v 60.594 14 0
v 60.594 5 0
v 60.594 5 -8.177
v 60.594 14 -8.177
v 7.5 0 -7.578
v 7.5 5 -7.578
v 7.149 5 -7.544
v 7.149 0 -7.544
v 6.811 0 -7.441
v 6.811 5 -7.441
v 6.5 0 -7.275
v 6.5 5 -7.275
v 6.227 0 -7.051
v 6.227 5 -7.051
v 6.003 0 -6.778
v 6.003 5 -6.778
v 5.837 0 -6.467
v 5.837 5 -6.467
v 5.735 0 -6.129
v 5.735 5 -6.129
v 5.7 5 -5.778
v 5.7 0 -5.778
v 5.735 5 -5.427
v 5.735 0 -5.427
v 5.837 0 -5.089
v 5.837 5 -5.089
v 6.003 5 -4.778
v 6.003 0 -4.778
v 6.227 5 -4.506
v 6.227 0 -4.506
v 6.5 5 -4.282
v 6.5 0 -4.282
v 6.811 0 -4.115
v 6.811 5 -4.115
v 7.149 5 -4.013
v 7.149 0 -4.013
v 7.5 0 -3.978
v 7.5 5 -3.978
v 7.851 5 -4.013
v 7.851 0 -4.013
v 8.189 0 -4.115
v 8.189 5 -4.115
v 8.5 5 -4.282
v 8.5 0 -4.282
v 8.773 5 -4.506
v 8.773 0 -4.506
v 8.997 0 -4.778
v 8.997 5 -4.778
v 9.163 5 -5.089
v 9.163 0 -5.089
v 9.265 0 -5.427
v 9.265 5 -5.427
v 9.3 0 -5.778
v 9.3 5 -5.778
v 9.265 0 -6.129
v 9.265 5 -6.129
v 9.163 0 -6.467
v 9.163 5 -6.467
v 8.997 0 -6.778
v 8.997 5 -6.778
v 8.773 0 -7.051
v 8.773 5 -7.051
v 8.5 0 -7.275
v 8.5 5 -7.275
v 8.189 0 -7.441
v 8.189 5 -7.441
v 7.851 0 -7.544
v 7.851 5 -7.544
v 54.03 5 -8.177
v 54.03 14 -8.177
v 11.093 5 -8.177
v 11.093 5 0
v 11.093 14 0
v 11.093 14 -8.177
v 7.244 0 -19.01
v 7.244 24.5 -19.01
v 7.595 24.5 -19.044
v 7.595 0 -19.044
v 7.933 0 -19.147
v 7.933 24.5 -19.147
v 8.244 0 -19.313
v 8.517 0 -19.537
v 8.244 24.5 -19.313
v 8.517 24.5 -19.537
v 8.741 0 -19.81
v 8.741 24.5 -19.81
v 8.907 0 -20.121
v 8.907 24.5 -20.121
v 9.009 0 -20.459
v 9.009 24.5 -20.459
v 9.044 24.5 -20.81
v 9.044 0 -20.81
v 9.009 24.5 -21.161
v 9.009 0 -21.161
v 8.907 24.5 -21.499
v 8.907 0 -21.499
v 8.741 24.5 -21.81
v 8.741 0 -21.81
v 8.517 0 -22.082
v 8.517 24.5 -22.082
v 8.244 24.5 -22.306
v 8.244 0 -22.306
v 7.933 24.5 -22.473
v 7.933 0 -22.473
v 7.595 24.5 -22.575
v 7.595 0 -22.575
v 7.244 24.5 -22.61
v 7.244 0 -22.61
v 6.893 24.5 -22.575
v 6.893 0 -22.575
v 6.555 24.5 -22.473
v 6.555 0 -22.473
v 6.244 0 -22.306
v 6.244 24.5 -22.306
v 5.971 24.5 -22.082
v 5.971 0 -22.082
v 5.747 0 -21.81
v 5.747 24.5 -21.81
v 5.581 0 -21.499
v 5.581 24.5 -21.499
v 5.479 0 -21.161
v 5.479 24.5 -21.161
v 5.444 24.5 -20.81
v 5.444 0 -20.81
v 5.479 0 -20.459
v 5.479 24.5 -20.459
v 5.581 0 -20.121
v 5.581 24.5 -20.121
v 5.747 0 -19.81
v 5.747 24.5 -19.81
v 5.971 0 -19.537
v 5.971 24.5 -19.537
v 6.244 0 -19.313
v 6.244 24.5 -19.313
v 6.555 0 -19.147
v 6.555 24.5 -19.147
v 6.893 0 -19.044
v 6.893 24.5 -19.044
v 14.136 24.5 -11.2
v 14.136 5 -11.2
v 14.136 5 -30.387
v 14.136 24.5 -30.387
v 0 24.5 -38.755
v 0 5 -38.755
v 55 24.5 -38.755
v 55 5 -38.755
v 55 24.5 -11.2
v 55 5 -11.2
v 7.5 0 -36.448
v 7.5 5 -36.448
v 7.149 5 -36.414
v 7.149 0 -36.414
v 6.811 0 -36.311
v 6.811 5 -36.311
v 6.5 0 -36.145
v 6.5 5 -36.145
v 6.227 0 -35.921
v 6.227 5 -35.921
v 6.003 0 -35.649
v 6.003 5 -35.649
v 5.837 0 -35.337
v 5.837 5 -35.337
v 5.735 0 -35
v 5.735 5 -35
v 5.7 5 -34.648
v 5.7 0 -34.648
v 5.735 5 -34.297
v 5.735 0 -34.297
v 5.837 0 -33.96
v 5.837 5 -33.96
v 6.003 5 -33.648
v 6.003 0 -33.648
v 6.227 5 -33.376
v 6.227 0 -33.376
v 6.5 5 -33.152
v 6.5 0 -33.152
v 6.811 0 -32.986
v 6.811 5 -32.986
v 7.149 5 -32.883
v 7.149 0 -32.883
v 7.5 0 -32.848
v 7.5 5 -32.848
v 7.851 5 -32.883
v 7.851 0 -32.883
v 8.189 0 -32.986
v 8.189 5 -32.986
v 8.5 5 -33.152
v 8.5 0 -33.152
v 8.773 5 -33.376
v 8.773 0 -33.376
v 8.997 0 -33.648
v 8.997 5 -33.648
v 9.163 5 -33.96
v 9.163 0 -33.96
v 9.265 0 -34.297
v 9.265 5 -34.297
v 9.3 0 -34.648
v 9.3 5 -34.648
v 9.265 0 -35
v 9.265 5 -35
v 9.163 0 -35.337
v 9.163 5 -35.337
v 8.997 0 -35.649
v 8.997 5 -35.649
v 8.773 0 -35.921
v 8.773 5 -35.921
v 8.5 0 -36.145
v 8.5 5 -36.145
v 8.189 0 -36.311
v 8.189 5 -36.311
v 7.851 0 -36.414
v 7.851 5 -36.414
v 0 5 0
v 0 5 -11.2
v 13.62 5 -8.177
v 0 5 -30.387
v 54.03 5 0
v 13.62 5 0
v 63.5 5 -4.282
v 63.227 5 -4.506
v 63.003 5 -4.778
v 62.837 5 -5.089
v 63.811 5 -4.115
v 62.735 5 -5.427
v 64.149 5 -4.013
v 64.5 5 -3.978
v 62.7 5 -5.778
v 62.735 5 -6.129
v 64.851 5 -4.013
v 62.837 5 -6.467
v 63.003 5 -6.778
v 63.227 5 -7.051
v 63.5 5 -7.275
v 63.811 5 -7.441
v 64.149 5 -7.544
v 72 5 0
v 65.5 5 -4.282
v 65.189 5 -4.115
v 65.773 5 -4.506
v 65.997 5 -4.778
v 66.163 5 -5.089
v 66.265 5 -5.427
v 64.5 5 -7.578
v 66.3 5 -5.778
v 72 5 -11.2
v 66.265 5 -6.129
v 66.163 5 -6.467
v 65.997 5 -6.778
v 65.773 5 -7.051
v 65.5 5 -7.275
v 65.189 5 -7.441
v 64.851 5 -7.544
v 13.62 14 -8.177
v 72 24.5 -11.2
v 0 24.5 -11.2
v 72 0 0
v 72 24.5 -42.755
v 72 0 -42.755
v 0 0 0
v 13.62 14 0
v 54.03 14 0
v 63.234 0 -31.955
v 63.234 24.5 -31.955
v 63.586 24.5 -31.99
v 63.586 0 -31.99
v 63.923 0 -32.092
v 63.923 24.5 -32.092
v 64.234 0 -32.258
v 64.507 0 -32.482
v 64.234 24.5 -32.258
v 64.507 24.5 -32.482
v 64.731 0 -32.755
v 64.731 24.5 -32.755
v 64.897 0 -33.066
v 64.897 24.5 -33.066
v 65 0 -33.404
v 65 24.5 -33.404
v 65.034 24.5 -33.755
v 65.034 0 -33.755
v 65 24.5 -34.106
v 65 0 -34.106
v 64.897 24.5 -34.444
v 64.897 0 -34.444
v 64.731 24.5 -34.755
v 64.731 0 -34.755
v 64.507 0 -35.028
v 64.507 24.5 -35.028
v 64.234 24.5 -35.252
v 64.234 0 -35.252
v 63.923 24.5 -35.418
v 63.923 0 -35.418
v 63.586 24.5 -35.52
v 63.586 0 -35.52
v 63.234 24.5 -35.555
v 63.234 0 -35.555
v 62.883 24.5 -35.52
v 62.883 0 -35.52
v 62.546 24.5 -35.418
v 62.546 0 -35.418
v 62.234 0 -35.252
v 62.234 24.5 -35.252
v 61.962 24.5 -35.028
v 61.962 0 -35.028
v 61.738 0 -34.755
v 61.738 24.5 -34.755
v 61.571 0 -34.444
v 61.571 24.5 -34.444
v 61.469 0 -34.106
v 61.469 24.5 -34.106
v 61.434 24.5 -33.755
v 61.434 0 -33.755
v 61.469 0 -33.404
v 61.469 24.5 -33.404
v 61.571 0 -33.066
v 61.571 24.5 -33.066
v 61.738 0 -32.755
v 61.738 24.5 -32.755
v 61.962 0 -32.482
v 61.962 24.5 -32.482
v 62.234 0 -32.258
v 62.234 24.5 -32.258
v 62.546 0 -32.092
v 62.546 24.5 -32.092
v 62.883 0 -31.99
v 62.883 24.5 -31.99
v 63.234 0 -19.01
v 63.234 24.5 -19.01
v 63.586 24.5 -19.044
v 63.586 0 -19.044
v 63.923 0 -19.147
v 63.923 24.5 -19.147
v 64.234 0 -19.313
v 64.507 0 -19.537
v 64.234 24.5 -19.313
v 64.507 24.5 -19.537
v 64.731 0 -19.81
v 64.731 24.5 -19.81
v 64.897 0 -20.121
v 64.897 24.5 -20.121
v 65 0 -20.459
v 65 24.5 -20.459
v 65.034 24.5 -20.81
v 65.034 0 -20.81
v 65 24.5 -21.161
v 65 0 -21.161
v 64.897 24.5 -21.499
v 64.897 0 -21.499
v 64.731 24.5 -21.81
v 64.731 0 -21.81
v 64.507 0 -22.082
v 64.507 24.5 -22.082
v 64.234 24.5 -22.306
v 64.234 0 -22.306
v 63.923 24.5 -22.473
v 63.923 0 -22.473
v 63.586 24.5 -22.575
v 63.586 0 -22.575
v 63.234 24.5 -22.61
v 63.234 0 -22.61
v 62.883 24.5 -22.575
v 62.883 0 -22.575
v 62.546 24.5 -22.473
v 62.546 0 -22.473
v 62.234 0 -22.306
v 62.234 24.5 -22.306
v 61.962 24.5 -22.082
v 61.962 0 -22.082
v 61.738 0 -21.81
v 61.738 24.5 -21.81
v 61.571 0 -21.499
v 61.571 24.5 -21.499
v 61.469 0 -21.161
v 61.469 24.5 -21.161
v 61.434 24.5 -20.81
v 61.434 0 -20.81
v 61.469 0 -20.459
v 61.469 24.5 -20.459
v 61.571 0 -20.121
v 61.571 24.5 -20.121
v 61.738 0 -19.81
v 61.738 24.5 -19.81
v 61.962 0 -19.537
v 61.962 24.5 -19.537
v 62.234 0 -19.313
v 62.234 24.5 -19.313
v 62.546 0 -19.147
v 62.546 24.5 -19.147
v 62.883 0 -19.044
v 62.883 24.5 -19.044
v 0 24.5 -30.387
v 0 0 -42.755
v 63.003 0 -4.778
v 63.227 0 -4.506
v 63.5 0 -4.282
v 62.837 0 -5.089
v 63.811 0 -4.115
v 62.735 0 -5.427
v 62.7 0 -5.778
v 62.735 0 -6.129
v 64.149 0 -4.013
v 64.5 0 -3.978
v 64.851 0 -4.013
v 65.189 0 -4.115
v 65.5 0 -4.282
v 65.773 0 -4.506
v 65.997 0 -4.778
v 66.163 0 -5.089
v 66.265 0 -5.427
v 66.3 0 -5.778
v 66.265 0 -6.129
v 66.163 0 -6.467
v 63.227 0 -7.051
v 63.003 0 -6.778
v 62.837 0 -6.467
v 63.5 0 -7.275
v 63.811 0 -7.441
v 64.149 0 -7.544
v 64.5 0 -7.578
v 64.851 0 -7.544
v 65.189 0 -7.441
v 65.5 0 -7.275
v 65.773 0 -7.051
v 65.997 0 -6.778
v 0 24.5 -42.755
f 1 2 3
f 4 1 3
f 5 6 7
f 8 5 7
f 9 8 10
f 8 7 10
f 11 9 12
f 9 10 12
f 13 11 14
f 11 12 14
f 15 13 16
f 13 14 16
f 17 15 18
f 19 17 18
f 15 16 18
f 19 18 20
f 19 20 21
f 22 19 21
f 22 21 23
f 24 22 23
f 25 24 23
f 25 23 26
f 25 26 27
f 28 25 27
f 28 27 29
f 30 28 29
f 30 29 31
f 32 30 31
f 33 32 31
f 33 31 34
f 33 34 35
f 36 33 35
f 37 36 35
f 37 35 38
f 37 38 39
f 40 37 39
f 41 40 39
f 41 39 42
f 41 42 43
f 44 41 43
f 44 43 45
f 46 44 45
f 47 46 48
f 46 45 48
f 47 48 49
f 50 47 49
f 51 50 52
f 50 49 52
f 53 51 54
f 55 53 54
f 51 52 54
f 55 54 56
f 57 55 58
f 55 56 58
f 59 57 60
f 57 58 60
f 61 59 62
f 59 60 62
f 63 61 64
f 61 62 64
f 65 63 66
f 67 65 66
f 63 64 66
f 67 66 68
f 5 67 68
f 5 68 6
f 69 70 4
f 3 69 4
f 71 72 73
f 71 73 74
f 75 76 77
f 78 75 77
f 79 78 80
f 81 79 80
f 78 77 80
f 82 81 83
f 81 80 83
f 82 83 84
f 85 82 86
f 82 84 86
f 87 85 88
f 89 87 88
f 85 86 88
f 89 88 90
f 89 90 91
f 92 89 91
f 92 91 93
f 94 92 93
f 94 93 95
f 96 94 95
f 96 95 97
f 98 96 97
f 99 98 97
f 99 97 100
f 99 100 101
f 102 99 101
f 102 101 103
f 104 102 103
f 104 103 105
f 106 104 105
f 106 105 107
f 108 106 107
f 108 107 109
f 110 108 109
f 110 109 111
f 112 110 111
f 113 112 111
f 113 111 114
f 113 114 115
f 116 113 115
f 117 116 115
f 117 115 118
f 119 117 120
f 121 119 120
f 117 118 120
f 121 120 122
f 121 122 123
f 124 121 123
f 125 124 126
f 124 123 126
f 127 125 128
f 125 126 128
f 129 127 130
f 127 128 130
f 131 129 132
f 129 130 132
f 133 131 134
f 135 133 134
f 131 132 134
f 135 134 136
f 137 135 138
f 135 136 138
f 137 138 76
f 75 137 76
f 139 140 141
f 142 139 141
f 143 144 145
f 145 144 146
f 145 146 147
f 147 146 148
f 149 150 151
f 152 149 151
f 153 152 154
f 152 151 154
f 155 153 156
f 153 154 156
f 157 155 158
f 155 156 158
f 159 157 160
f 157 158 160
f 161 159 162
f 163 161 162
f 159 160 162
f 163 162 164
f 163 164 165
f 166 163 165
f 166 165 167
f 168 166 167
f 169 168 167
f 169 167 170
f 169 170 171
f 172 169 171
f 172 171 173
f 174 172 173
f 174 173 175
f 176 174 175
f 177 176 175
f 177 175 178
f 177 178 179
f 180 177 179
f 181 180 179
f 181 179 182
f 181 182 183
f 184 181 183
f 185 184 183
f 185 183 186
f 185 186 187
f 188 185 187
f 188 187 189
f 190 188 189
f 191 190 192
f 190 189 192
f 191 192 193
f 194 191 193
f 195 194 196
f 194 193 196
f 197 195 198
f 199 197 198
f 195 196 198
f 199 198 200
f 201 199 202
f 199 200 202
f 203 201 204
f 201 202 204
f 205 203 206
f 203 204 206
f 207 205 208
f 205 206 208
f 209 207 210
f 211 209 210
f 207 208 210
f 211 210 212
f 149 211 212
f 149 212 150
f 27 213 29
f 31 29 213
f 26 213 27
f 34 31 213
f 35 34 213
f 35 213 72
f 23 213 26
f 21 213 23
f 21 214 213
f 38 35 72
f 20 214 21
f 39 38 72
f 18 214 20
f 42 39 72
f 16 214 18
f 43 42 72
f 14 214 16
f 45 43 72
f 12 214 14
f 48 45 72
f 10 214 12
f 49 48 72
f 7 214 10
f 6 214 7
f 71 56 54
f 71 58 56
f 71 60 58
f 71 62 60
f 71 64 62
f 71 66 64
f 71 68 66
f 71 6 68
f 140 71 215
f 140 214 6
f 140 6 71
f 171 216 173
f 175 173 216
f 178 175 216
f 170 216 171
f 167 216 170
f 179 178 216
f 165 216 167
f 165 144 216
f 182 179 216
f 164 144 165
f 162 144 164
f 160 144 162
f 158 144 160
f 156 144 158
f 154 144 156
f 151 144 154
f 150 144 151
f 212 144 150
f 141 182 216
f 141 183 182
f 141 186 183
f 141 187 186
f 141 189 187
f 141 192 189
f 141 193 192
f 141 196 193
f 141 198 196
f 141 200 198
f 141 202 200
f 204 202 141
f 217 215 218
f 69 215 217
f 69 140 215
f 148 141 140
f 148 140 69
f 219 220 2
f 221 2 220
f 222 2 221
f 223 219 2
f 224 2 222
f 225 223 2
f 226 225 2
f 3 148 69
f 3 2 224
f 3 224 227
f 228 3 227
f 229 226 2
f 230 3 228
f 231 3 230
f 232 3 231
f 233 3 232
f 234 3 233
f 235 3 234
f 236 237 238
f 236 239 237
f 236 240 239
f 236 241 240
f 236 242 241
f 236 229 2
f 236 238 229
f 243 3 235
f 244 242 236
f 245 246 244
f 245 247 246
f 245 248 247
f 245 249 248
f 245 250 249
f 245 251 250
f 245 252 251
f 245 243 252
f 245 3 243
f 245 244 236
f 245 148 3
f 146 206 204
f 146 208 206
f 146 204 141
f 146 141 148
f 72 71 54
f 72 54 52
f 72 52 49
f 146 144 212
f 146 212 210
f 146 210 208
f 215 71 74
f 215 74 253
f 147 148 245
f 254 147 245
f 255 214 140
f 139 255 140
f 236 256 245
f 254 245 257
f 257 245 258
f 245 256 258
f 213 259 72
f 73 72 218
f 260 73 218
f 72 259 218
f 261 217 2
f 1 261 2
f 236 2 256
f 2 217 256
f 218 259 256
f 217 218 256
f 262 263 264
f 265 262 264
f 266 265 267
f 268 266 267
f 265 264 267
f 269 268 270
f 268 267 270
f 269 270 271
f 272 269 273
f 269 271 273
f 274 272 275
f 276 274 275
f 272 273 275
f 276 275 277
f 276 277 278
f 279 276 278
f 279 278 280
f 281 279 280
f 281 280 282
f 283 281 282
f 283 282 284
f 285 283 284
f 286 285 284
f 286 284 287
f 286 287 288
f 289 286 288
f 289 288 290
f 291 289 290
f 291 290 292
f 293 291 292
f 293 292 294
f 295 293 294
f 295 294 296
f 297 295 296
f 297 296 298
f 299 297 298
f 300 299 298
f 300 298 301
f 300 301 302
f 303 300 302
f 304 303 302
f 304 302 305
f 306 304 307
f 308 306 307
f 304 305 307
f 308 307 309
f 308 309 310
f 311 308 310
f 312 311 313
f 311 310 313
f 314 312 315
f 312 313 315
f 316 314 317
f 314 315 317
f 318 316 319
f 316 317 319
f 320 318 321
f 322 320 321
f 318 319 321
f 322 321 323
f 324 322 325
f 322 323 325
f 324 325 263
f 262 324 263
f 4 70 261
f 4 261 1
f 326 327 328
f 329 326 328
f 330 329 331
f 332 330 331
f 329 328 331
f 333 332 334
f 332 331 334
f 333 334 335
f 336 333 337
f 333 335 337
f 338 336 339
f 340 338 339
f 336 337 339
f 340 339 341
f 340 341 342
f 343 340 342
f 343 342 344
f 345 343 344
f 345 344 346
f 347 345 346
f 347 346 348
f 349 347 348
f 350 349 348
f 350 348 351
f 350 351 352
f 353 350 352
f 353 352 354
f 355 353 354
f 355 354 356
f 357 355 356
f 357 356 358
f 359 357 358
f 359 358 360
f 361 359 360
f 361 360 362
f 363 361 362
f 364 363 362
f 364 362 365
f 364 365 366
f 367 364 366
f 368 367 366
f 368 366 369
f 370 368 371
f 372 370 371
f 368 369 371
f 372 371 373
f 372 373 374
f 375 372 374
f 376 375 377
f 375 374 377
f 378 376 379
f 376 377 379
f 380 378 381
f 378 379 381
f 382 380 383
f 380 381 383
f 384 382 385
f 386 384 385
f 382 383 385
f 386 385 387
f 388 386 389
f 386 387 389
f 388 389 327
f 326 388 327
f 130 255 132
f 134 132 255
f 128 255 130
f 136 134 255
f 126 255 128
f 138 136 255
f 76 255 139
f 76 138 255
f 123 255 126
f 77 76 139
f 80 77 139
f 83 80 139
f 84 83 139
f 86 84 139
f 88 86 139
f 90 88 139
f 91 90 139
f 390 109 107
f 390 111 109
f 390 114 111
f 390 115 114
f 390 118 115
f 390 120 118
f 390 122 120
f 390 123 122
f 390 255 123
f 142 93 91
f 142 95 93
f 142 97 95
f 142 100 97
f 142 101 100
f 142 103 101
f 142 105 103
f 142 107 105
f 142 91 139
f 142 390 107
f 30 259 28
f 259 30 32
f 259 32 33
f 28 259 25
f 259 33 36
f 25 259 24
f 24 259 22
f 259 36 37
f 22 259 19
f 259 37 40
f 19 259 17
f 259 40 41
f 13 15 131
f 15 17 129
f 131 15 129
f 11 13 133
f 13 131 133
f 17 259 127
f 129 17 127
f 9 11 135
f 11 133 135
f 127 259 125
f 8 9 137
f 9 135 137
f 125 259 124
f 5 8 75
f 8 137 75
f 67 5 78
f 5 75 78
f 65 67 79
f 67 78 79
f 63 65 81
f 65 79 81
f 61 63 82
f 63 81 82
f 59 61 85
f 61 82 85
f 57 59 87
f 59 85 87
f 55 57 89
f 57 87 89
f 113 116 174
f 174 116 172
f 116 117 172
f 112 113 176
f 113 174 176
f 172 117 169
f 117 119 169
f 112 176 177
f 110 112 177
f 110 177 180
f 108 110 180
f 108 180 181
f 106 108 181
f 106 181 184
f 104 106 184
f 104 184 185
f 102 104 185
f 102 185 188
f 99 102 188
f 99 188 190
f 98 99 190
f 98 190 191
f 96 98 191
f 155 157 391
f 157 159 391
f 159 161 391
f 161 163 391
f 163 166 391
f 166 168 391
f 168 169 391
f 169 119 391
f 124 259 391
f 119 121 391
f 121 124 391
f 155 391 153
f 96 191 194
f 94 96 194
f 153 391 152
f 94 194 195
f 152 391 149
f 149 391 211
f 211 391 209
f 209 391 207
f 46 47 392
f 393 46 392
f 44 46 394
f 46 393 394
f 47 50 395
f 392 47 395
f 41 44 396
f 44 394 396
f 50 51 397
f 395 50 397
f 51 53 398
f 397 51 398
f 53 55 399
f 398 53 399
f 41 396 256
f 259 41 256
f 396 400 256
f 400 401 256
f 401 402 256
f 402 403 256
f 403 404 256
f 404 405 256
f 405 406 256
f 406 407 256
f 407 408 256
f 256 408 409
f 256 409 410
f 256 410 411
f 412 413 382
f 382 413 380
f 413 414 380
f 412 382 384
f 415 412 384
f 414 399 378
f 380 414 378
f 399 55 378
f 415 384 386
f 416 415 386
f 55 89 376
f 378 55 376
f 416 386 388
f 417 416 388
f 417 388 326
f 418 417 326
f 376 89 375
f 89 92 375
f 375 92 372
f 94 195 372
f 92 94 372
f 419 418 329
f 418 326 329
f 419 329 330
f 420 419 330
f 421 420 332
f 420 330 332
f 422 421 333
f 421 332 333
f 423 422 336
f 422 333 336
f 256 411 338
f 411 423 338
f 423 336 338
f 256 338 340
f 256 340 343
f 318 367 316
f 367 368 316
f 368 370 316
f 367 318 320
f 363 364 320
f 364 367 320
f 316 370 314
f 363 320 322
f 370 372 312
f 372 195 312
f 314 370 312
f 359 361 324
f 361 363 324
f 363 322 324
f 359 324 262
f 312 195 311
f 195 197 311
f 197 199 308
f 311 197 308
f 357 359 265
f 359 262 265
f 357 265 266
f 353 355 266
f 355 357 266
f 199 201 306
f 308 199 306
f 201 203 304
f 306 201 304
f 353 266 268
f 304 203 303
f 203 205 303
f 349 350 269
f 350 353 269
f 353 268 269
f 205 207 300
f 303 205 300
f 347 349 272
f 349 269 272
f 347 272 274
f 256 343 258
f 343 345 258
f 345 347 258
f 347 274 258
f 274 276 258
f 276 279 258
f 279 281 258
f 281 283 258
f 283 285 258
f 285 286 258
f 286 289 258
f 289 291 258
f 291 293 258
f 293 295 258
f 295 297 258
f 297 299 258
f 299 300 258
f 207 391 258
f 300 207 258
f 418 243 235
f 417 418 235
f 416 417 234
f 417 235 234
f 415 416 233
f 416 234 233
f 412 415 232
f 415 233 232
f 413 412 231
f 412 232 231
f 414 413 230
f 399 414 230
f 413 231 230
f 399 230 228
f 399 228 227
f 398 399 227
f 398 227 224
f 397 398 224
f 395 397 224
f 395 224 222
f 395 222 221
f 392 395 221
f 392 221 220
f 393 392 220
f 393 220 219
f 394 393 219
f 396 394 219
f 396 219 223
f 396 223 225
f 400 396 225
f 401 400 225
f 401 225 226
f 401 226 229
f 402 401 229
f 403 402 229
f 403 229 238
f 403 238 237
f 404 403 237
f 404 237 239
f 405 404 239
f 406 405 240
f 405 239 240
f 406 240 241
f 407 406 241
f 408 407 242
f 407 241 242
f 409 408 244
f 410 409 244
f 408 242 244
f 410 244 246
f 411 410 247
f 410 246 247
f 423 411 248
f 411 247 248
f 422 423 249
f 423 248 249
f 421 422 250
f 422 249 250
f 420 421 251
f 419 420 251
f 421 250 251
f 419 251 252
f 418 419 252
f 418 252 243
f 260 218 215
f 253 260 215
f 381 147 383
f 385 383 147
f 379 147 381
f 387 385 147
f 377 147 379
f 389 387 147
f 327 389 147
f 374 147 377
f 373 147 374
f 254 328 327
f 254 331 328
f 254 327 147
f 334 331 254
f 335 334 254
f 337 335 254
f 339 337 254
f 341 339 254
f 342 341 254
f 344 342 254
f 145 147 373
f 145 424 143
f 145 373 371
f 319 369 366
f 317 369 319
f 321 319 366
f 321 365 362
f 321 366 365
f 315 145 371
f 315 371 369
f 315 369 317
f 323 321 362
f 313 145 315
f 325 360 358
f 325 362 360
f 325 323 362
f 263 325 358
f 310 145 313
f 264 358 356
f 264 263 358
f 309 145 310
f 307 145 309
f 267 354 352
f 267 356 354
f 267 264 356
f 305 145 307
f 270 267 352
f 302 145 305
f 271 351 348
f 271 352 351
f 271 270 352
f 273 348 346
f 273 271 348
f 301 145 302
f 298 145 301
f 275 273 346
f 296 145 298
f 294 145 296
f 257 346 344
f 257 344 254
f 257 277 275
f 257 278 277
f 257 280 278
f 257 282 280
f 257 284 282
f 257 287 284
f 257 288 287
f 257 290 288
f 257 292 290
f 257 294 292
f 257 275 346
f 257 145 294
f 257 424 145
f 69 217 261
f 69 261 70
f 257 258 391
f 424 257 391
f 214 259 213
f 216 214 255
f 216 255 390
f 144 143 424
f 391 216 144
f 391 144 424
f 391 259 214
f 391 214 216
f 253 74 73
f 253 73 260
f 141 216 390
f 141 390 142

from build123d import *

# Parameters (mm, degrees)
SKETCH2_W                = 72
SKETCH2_H                = 40
BOSS_EXTRUDE1_DEPTH      = 5
BOSS_EXTRUDE2_DEPTH      = 19.5
BOSS_EXTRUDE2_DEPTH_BACK = 5
SKETCH3_W                = 14.135898402
SKETCH3_H                = 19.186853455
CUT_EXTRUDE1_START       = 19.5
SKETCH4_R                = 1.8
CUT_EXTRUDE1_DEPTH       = 30
SKETCH8_W                = 2.527236714
SKETCH8_H                = 8.177193873
SKETCH8_W_2              = 6.563624393
BOSS_EXTRUDE7_DEPTH      = 9
SKETCH9_R                = 1.8
CUT_EXTRUDE2_DEPTH       = 53


with BuildPart() as part:
    # Sketch2 → Boss-Extrude1 (new body)
    with BuildSketch(Plane(origin=(0, 0, 0), x_dir=(1, 0, 0), z_dir=(0, 1, 0))):
        with Locations((36, 20)):
            Rectangle(SKETCH2_W, SKETCH2_H)
    extrude(amount=BOSS_EXTRUDE1_DEPTH)

    # Sketch3 → Boss-Extrude2 (add, two sides: drawn at the far end of the back side and taken through both)
    with BuildSketch(Plane(origin=(0, 5, 0), x_dir=(1, 0, 0), z_dir=(0, 1, 0)).offset(-BOSS_EXTRUDE2_DEPTH_BACK)):
        with Locations((7.067949201, 20.793426728)):
            Rectangle(SKETCH3_W, SKETCH3_H)
        Polygon((55, 38.754979203), (55, 11.2), (72, 11.2), (72, 42.754979203), (0, 42.754979203), (0, 38.754979203), align=None)
    extrude(amount=BOSS_EXTRUDE2_DEPTH + BOSS_EXTRUDE2_DEPTH_BACK)

    # Sketch4 → Cut-Extrude1 (cut)
    with BuildSketch(Plane(origin=(0, 5, 0), x_dir=(1, 0, 0), z_dir=(0, 1, 0)).offset(CUT_EXTRUDE1_START)):
        with Locations(Location((7.5, 34.648486257, 0), (0, 0, 90))):
            Circle(SKETCH4_R)
        with Locations(Location((7.5, 5.778304463, 0), (0, 0, 90))):
            Circle(SKETCH4_R)
        with Locations(Location((64.5, 5.778304463, 0), (0, 0, 90))):
            Circle(SKETCH4_R)
    extrude(amount=-CUT_EXTRUDE1_DEPTH, mode=Mode.SUBTRACT)

    # Sketch8 → Boss-Extrude7 (add)
    with BuildSketch(Plane(origin=(0, 5, 0), x_dir=(1, 0, 0), z_dir=(0, 1, 0))):
        with Locations((12.356862163, 4.088596937)):
            Rectangle(SKETCH8_W, SKETCH8_H)
        with Locations((57.312199978, 4.088596937)):
            Rectangle(SKETCH8_W_2, SKETCH8_H)
    extrude(amount=BOSS_EXTRUDE7_DEPTH)

    # Sketch9 → Cut-Extrude2 (cut)
    with BuildSketch(Plane(origin=(0, 24.5, 0), x_dir=(1, 0, 0), z_dir=(0, 1, 0))):
        with Locations(Location((7.244076977, 20.809705714, 0), (0, 0, 270))):
            Circle(SKETCH9_R)
        with Locations(Location((63.234445615, 20.809705714, 0), (0, 0, 270))):
            Circle(SKETCH9_R)
        with Locations(Location((63.234445615, 33.7549792, 0), (0, 0, 270))):
            Circle(SKETCH9_R)
    extrude(amount=-CUT_EXTRUDE2_DEPTH, mode=Mode.SUBTRACT)


solid = part.part
